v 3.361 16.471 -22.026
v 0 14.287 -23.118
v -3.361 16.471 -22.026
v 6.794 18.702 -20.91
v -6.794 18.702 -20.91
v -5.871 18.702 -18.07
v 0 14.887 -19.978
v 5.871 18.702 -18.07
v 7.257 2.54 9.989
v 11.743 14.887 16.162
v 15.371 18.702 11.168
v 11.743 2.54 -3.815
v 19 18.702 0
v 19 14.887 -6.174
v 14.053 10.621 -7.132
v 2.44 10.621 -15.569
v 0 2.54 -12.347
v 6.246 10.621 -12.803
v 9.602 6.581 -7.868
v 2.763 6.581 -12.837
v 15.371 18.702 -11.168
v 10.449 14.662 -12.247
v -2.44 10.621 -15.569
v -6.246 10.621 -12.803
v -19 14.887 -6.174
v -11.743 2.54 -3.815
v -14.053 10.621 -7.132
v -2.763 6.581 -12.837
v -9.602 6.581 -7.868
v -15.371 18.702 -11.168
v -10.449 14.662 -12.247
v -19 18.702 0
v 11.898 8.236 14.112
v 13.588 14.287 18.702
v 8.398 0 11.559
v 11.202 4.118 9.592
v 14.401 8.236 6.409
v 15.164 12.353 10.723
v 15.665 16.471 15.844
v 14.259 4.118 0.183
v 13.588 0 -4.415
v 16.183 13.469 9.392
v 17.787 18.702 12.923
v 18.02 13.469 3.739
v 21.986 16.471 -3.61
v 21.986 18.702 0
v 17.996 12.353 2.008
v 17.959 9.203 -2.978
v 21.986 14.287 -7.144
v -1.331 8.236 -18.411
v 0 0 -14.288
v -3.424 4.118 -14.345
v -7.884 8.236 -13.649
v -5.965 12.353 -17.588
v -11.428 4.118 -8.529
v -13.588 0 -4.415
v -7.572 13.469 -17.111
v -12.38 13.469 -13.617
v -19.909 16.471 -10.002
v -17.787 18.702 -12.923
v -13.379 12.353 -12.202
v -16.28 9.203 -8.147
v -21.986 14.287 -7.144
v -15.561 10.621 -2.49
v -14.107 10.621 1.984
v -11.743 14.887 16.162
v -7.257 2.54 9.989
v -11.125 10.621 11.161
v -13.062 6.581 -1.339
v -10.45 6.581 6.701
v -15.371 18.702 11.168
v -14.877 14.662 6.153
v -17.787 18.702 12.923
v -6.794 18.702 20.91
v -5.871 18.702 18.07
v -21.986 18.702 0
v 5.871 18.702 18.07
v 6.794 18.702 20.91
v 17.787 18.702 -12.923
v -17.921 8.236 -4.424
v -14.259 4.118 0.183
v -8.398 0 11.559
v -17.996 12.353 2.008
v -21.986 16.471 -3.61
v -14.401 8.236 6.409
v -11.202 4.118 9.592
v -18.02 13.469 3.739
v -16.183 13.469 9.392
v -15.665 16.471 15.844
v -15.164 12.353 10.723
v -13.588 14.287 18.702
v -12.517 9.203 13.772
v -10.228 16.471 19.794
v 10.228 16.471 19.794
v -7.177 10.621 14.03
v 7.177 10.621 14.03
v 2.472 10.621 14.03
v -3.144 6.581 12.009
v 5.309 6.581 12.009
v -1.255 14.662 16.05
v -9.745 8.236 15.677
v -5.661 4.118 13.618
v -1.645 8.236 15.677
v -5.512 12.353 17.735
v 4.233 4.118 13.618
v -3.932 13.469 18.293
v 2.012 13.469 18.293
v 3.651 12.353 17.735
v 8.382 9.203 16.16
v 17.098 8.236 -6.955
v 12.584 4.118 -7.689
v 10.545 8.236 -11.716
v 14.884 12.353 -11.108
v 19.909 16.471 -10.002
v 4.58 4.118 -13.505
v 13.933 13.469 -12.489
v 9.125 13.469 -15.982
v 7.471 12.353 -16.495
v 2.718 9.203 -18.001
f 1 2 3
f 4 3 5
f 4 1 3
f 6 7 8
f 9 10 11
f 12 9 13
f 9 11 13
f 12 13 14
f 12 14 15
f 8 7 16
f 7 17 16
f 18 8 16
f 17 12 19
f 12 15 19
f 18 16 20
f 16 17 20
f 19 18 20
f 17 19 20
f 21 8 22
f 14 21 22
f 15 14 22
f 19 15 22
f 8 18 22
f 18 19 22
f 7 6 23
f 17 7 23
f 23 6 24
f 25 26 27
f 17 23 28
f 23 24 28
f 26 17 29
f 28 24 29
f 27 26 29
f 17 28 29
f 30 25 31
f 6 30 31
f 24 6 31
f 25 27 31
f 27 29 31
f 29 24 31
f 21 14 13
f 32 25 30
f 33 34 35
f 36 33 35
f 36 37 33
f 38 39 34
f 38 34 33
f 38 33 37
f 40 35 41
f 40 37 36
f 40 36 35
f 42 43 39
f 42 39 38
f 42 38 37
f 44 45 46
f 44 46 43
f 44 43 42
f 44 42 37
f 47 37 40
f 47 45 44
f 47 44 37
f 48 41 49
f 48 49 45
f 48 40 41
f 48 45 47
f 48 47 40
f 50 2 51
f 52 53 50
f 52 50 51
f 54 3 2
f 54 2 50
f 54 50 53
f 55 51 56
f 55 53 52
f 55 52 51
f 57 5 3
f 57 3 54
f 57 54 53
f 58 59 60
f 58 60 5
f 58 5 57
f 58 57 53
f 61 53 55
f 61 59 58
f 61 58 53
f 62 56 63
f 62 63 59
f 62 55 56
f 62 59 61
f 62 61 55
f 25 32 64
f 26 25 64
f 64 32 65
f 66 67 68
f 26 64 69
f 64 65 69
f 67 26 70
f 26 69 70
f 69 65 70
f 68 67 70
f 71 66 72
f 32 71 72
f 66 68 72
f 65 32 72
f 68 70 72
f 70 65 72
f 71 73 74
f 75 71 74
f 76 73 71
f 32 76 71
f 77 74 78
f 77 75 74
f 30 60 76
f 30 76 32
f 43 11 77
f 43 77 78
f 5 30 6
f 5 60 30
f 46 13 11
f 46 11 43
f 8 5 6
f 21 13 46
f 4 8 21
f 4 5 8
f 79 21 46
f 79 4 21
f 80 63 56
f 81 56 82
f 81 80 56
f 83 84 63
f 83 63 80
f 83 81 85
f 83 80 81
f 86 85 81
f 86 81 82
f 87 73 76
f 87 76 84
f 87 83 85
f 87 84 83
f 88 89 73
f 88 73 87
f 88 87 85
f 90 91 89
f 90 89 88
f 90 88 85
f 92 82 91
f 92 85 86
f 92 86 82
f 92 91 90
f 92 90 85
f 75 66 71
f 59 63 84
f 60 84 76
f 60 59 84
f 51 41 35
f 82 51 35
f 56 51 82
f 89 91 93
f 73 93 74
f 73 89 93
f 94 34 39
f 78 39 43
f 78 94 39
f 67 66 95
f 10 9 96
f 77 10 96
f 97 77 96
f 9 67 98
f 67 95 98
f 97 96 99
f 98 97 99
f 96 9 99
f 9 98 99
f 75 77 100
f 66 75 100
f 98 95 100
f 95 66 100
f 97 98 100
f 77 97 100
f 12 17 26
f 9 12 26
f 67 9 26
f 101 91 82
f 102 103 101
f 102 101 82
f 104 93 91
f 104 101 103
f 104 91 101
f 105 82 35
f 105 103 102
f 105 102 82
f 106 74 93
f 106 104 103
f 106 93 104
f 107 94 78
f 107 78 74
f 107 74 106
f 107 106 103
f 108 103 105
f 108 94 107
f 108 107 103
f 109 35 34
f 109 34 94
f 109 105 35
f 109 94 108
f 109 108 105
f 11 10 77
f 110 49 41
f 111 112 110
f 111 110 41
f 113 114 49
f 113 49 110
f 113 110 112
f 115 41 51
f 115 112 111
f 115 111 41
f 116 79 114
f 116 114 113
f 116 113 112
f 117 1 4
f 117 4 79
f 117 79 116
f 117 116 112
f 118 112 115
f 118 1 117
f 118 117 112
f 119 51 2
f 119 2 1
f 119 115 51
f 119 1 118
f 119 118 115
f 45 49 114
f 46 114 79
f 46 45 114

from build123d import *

# Parameters (mm, degrees)
BOSS_EXTRUDE1_DEPTH = 33.2486
BOSS_EXTRUDE1_TAPER = -26.56505118
SKETCH2_OUTSIDE_W   = 117.17
SKETCH2_OUTSIDE_H   = 114.076
CUT_EXTRUDE1_DEPTH  = 33.2486
CUT_EXTRUDE1_TAPER  = 26.56505118
SCALE1_SCALE        = 1.125
SKETCH3_W           = 93.211542344
SKETCH3_H           = 68.986167311
CUT_EXTRUDE2_DEPTH  = 19.7023376
SHELL1_T            = -2.54


with BuildPart() as part:
    # Sketch1 → Boss-Extrude1 (new body)
    with BuildSketch(Plane(origin=(0, 0, 0), x_dir=(1, 0, 0), z_dir=(0, 1, 0))):
        Polygon((12.078417757, 3.924515829), (0, 12.7), (-12.078417757, 3.924515829), (-7.464872704, -10.274515829), (7.464872704, -10.274515829), align=None)
    extrude(amount=BOSS_EXTRUDE1_DEPTH, taper=BOSS_EXTRUDE1_TAPER)

    # Sketch2 outside → Cut-Extrude1 (cut)
    with BuildSketch(Plane(origin=(0, 33.2486, 0), x_dir=(1, 0, 0), z_dir=(0, 1, 0))):
        with Locations((0, 3.175)):
            Rectangle(SKETCH2_OUTSIDE_W, SKETCH2_OUTSIDE_H)
        Polygon((7.464872704, 10.274515829), (-7.464872704, 10.274515829), (-12.078417757, -3.924515829), (0, -12.7), (12.078417757, -3.924515829), align=None, mode=Mode.SUBTRACT)
    extrude(amount=-CUT_EXTRUDE1_DEPTH, taper=CUT_EXTRUDE1_TAPER, mode=Mode.SUBTRACT)


with BuildPart() as part_1:
    # Scale1: scaled about (0, 0, 0)
    add(part.part.scale(SCALE1_SCALE))

    # Sketch3 → Cut-Extrude2 (cut, through all)
    with BuildSketch(Plane(origin=(0, 18.7023375, 0), x_dir=(1, 0, 0), z_dir=(0, 1, 0))):
        with Locations((6.510218593, 0.168740009)):
            Rectangle(SKETCH3_W, SKETCH3_H)
    extrude(amount=CUT_EXTRUDE2_DEPTH, mode=Mode.SUBTRACT)

    # Shell1
    shell1_openings = [part_1.faces().sort_by_distance(p)[0] for p in [
        (0, 18.7023375, 0),
    ]]
    offset(amount=SHELL1_T, openings=shell1_openings, kind=Kind.INTERSECTION)


solid = part_1.part
